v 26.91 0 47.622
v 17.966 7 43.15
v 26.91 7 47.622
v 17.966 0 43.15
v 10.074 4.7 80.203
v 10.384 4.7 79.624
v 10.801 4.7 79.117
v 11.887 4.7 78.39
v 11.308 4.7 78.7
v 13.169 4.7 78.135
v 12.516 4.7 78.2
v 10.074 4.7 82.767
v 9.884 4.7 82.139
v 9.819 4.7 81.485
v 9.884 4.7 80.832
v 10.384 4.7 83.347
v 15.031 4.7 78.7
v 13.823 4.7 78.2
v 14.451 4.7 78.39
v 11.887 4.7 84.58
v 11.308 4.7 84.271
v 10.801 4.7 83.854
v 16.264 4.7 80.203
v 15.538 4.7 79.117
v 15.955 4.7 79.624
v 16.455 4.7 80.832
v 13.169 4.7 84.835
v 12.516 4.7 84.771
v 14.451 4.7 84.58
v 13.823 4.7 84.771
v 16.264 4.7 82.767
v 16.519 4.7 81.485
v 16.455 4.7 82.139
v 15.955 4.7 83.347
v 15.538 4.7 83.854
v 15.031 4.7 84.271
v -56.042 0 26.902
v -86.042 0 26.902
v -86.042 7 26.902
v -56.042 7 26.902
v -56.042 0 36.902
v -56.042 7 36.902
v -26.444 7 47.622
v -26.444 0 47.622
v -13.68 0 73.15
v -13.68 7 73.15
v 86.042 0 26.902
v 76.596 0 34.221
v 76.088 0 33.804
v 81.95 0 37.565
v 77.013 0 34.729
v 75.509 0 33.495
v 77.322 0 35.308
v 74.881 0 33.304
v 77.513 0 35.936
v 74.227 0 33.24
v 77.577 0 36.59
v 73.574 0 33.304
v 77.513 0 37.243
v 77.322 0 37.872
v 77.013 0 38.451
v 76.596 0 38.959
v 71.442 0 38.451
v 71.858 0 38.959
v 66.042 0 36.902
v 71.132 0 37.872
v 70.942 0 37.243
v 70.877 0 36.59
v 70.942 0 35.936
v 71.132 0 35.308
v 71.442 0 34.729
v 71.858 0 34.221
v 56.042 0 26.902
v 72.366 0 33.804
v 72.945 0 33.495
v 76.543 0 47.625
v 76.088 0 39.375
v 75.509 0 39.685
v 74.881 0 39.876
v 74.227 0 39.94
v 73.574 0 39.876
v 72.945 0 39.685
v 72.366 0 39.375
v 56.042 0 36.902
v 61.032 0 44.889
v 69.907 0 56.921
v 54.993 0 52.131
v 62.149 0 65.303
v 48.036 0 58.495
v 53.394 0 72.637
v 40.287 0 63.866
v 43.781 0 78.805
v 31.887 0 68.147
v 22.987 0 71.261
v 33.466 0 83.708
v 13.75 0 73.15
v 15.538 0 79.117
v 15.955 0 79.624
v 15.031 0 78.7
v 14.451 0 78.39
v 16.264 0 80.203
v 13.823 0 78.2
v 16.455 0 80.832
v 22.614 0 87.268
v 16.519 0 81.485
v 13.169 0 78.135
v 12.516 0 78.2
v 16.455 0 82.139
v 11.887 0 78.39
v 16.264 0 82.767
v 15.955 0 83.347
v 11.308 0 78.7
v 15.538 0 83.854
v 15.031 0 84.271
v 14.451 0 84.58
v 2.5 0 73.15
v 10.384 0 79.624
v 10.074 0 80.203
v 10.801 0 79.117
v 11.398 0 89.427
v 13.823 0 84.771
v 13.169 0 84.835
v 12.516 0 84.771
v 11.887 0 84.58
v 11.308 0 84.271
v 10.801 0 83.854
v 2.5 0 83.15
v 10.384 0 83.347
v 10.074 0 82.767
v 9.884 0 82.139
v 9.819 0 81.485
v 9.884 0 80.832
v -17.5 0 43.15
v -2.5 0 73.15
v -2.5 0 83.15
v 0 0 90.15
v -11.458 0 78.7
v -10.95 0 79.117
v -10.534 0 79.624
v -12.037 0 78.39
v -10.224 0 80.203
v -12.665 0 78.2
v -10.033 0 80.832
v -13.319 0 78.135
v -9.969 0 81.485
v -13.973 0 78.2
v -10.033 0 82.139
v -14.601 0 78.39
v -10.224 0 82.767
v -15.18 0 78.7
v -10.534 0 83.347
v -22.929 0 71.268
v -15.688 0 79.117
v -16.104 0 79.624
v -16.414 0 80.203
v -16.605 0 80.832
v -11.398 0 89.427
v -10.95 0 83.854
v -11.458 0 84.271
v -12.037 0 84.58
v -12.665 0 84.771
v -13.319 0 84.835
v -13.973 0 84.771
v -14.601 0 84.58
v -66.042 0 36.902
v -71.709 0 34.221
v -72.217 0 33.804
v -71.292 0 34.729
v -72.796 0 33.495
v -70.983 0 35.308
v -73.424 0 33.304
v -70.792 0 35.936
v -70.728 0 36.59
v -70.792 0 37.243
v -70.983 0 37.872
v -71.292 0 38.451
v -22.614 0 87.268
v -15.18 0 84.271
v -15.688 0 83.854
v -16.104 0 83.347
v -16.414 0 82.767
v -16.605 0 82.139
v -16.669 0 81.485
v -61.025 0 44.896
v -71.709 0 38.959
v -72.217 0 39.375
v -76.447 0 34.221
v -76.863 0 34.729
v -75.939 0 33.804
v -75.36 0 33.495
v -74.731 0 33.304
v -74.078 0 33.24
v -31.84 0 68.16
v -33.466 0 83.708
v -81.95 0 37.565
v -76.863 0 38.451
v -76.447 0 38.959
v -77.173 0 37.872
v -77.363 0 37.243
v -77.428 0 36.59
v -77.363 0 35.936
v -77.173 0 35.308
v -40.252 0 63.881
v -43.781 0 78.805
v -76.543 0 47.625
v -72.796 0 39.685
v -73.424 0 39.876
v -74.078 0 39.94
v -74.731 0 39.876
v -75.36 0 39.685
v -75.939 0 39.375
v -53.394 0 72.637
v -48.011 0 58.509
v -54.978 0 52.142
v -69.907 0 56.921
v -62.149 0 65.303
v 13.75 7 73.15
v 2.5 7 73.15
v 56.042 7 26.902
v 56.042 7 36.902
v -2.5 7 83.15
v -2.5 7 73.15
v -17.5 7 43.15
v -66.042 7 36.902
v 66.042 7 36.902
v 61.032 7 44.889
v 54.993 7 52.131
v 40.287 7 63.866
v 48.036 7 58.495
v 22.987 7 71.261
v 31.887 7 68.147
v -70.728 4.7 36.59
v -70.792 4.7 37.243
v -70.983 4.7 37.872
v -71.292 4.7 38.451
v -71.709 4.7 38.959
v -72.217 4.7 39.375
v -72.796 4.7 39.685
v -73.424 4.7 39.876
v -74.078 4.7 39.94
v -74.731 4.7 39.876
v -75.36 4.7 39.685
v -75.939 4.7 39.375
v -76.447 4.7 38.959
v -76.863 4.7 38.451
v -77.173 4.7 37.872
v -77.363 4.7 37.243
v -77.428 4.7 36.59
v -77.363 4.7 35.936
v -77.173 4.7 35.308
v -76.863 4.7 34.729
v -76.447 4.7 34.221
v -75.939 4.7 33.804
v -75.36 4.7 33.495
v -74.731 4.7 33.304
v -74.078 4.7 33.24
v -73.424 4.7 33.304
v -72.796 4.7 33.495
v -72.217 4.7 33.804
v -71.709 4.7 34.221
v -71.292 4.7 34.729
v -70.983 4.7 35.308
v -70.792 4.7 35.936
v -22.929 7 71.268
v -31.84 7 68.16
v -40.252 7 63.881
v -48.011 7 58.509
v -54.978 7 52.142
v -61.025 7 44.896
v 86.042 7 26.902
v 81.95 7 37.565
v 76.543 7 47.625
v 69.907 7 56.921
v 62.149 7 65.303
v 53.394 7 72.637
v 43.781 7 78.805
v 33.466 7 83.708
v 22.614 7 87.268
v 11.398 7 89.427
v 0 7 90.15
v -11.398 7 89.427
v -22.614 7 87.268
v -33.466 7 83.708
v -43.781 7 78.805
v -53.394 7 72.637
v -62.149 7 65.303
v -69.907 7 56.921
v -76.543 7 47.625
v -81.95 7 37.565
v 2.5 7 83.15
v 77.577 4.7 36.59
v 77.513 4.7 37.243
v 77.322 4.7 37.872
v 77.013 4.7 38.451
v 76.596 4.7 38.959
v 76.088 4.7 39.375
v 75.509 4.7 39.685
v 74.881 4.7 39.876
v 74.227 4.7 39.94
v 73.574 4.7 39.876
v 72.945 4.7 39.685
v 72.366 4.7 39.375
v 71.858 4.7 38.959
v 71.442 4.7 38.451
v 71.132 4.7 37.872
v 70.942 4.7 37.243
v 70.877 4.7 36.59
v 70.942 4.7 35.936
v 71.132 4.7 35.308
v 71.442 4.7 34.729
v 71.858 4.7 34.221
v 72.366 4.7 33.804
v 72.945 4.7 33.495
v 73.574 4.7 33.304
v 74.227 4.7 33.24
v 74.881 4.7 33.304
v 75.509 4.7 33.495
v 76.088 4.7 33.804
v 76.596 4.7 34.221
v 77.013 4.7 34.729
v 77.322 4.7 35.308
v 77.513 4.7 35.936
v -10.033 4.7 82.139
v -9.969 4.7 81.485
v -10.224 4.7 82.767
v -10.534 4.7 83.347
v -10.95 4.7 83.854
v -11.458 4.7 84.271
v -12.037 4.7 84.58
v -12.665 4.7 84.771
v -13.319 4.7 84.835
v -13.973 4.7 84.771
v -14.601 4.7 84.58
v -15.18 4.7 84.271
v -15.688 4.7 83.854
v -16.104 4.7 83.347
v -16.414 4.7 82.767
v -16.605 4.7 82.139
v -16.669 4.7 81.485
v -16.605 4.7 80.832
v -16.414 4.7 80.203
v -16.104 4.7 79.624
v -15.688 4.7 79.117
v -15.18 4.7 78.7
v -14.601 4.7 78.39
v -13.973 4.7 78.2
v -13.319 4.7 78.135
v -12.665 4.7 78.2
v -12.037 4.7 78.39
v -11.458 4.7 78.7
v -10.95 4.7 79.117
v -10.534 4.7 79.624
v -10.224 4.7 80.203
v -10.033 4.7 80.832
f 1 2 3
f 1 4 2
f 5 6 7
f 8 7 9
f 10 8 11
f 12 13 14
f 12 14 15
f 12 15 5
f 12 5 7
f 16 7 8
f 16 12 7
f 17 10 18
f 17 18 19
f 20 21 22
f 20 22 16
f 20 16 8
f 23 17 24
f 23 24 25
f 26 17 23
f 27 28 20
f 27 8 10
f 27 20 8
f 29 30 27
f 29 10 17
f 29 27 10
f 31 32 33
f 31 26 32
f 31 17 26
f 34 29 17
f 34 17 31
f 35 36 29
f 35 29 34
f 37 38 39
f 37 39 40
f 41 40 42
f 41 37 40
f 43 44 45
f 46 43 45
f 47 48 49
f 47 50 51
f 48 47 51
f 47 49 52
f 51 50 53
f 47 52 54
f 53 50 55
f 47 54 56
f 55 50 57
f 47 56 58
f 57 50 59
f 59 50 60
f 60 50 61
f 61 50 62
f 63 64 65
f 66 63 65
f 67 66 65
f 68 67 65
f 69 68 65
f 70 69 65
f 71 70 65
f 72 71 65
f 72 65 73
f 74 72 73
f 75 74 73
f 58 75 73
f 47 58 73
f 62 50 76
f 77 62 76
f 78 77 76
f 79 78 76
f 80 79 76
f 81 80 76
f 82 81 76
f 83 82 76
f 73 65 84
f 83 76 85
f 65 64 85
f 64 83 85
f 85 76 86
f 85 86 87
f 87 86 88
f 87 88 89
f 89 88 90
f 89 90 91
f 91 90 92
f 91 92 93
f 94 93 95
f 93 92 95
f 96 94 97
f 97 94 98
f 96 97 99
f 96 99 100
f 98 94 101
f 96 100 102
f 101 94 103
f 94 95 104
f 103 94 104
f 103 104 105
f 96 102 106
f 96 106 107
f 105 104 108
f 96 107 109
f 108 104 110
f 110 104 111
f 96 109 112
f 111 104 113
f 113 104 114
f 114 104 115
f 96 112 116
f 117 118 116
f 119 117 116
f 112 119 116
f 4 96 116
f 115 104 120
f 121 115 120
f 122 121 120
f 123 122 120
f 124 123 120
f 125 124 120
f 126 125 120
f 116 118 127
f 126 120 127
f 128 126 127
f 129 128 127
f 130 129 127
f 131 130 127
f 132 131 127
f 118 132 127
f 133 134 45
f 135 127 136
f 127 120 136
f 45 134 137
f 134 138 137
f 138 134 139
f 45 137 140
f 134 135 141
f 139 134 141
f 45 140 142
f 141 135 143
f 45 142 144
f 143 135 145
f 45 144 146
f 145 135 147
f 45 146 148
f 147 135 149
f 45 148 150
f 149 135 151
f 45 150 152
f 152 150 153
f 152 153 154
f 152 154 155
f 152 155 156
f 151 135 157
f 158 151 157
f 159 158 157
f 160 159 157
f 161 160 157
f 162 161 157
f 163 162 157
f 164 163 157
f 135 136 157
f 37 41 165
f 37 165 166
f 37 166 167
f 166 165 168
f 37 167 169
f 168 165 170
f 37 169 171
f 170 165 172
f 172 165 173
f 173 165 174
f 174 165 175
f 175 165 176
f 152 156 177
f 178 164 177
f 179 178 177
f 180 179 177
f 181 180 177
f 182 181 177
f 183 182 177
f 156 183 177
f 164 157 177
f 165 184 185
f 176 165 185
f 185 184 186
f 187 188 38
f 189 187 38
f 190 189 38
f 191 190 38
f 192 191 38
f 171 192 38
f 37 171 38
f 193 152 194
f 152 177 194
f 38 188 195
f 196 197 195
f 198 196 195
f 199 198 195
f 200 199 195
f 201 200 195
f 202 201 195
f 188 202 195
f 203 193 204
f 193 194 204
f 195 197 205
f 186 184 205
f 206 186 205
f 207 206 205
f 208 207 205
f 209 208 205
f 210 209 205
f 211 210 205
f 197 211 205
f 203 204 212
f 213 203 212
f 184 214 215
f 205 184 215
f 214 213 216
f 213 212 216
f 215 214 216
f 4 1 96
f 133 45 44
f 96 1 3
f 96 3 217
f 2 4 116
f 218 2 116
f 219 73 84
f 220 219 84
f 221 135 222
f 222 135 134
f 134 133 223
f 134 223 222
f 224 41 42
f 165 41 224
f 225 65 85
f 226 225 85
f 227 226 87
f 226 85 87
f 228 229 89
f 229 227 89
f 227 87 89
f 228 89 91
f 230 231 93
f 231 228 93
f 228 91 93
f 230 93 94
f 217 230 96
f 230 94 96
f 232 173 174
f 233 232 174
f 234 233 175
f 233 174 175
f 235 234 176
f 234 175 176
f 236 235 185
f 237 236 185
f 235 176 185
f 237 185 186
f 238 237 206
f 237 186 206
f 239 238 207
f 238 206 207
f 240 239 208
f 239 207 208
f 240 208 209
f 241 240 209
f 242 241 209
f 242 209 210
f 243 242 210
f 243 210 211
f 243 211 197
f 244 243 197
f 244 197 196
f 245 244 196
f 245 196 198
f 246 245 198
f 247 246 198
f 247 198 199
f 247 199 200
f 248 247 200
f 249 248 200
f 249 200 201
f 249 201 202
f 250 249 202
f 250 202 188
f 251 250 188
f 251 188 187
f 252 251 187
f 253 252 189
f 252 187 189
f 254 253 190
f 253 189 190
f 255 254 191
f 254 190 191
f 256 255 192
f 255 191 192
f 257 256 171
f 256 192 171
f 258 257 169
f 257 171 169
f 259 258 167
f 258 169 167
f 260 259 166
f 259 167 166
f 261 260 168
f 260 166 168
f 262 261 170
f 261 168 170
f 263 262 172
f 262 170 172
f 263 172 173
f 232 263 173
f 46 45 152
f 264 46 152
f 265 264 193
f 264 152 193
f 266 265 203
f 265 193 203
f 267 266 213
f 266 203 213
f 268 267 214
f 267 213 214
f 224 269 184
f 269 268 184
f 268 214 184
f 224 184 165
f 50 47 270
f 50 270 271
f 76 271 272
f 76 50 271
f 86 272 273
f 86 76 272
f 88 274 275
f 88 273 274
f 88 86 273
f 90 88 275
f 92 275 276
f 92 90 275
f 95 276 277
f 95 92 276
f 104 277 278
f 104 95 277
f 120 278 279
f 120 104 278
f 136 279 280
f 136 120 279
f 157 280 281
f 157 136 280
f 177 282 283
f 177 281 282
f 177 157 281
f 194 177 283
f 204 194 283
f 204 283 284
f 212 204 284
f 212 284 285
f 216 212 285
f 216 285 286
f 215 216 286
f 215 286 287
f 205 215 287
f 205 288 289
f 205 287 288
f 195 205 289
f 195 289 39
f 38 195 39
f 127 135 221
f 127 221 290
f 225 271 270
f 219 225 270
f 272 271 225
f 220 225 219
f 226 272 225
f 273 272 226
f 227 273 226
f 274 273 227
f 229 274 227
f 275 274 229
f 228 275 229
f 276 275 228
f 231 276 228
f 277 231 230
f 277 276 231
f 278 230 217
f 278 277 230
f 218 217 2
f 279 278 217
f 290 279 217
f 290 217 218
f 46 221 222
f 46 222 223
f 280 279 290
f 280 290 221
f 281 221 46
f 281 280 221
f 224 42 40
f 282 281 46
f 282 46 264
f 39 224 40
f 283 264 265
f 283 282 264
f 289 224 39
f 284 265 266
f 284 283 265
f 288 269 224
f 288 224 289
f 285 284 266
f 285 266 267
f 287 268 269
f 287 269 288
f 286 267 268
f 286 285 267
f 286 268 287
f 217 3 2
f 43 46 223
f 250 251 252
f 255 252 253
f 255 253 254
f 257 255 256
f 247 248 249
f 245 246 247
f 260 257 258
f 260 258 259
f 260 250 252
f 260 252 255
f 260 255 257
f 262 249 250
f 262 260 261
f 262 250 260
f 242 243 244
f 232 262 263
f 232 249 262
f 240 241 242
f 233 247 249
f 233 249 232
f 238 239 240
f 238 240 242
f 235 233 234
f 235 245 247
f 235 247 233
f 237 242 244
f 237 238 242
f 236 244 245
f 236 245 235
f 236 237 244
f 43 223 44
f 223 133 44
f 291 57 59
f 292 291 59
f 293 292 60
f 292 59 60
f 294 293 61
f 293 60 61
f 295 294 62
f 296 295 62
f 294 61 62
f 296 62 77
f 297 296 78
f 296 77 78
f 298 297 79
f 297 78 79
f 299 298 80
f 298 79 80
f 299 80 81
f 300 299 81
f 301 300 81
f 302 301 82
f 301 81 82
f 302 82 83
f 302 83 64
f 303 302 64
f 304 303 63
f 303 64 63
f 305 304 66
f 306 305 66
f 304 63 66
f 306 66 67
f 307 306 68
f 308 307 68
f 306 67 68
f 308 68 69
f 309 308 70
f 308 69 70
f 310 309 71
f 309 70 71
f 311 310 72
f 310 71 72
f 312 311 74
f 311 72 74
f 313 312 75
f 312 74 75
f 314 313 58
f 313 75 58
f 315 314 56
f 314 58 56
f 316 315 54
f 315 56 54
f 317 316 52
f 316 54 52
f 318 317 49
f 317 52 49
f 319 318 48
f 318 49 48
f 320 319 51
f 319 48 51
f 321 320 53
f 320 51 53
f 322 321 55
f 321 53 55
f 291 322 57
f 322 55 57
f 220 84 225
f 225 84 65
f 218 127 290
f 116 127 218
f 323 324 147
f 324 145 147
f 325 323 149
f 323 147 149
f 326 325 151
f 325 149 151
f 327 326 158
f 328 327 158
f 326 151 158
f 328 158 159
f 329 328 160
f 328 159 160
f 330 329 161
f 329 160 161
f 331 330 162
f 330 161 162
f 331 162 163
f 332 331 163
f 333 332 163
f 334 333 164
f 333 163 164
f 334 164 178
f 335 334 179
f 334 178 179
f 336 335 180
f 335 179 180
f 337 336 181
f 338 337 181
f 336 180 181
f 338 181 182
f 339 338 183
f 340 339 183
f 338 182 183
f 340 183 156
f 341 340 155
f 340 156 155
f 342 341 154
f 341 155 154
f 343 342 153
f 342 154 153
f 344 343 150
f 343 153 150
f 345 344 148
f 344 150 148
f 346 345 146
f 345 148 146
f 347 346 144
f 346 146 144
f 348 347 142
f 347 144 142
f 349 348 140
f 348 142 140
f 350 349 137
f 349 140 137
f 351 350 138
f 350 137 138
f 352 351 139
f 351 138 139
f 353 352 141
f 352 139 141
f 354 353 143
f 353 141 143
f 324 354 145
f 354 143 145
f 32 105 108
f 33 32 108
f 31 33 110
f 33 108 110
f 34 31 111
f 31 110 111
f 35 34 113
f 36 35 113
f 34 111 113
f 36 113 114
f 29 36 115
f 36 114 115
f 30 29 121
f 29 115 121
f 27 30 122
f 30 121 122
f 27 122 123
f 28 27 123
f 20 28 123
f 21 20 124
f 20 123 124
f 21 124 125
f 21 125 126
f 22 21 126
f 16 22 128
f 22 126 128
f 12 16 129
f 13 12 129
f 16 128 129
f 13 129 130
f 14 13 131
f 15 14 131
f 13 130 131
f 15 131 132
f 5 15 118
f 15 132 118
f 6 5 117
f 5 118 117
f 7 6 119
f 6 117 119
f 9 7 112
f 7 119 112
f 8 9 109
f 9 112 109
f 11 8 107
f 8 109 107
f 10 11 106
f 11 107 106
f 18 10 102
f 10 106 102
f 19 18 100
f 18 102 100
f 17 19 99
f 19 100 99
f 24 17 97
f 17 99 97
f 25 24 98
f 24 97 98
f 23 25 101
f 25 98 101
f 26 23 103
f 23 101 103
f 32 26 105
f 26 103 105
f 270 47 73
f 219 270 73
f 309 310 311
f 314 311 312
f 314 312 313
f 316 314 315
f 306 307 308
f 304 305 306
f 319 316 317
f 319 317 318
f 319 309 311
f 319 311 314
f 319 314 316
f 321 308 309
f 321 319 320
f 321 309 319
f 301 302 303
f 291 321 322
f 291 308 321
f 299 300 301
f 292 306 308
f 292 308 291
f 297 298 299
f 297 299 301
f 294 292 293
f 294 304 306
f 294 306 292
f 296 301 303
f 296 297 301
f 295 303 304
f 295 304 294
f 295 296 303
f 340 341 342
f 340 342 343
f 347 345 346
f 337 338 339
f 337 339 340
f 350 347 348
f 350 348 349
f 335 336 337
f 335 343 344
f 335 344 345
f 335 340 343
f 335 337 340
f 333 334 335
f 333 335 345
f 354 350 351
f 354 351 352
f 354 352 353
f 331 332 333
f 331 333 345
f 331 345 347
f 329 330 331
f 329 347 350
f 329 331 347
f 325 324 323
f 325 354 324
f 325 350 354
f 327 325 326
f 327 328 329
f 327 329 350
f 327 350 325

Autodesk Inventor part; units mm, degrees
ref_plane "YZ Plane" through (0, 0, 0) normal (1, 0, 0) x (0, 1, 0)
ref_plane "XZ Plane" through (0, 0, 0) normal (0, 1, 0) x (-1, 0, 0)
ref_plane "XY Plane" through (0, 0, 0) normal (0, 0, 1) x (1, 0, 0)
sketch "Sketch1" plane through (0, 0, 0) normal (0, 1, 0) x (-1, 0, 0)
  line L0 (86.0424, 26.9023) -> (56.0424, 26.9023)
  line L1 (2.5, 83.15) -> (-2.5, 83.15)
  line L2 (2.5, 83.15) -> (2.5, 73.15)
  line L3 (-2.5, 83.15) -> (-2.5, 73.15)
  circle A0 centre (0, 0) radius 90.15
  line L4 (-86.0424, 26.9023) -> (-56.0424, 26.9023)
  line L5 (-56.0424, 26.9023) -> (-56.0424, 36.9023)
  line L6 (-56.0424, 36.9023) -> (-66.0424, 36.9023)
  line L7 (56.0424, 26.9023) -> (56.0424, 36.9023)
  line L8 (56.0424, 36.9023) -> (66.0424, 36.9023)
  line L9 (-17.9658, 43.15) -> (-2.5, 73.15)
  line L10 (17.5, 43.15) -> (2.5, 73.15)
  line L11 (17.5, 43.15) -> (26.4443, 47.6221)
  line L12 (26.4443, 47.6221) -> (13.6803, 73.15)
  line L13 (-17.9658, 43.15) -> (-26.9101, 47.6221)
  line L14 (-26.9101, 47.6221) -> (-13.7498, 73.15)
  arc A1 (66.0424, 36.9023) -> (13.6803, 73.15) centre (4.3796, 3.7706) ccw
  arc A2 (-13.7498, 73.15) -> (-66.0424, 36.9023) centre (-4.3742, 3.7807) ccw
  dimension "d28" = 180.3
  dimension "d1" = 30
  dimension "d20" = 5
  dimension "d21" = 10
  dimension "d22" = 10
  dimension "d29" = 30
  dimension "d30" = 10
  dimension "d31" = 10
  dimension "d32" = 10
  dimension "d33" = 10
  dimension "d37" = 10
  dimension "d38" = 10
  dimension "d39" = 70
  dimension "d40" = 70
extrude "Extrusion1" add sketch "Sketch1" along normal blind 7 contours L0 L7 L8 A1 L12 L11 L10 L2 L1 L3 L9 L13 L14 A2 L6 L5 L4 A0 picked at (-11.4052, 63.15)
sketch "Sketch2" plane through (0, 0, 0) normal (0, -1, 0) x (1, 0, 0)
  circle A0 centre (74.2273, 36.5899) radius 3.35
  circle A1 centre (-74.0777, 36.5899) radius 3.35
  circle A2 centre (-13.319, 81.4854) radius 3.35
  circle A3 centre (13.1694, 81.4854) radius 3.35
  point P0 (0, 0)
  dimension "d43" = 6.7
  dimension "d44" = 6.7
  dimension "d45" = 6.7
  dimension "d46" = 6.7
extrude "Extrusion2" cut sketch "Sketch2" against normal blind 4.7
properties part number "Droplet Launcher 2"
